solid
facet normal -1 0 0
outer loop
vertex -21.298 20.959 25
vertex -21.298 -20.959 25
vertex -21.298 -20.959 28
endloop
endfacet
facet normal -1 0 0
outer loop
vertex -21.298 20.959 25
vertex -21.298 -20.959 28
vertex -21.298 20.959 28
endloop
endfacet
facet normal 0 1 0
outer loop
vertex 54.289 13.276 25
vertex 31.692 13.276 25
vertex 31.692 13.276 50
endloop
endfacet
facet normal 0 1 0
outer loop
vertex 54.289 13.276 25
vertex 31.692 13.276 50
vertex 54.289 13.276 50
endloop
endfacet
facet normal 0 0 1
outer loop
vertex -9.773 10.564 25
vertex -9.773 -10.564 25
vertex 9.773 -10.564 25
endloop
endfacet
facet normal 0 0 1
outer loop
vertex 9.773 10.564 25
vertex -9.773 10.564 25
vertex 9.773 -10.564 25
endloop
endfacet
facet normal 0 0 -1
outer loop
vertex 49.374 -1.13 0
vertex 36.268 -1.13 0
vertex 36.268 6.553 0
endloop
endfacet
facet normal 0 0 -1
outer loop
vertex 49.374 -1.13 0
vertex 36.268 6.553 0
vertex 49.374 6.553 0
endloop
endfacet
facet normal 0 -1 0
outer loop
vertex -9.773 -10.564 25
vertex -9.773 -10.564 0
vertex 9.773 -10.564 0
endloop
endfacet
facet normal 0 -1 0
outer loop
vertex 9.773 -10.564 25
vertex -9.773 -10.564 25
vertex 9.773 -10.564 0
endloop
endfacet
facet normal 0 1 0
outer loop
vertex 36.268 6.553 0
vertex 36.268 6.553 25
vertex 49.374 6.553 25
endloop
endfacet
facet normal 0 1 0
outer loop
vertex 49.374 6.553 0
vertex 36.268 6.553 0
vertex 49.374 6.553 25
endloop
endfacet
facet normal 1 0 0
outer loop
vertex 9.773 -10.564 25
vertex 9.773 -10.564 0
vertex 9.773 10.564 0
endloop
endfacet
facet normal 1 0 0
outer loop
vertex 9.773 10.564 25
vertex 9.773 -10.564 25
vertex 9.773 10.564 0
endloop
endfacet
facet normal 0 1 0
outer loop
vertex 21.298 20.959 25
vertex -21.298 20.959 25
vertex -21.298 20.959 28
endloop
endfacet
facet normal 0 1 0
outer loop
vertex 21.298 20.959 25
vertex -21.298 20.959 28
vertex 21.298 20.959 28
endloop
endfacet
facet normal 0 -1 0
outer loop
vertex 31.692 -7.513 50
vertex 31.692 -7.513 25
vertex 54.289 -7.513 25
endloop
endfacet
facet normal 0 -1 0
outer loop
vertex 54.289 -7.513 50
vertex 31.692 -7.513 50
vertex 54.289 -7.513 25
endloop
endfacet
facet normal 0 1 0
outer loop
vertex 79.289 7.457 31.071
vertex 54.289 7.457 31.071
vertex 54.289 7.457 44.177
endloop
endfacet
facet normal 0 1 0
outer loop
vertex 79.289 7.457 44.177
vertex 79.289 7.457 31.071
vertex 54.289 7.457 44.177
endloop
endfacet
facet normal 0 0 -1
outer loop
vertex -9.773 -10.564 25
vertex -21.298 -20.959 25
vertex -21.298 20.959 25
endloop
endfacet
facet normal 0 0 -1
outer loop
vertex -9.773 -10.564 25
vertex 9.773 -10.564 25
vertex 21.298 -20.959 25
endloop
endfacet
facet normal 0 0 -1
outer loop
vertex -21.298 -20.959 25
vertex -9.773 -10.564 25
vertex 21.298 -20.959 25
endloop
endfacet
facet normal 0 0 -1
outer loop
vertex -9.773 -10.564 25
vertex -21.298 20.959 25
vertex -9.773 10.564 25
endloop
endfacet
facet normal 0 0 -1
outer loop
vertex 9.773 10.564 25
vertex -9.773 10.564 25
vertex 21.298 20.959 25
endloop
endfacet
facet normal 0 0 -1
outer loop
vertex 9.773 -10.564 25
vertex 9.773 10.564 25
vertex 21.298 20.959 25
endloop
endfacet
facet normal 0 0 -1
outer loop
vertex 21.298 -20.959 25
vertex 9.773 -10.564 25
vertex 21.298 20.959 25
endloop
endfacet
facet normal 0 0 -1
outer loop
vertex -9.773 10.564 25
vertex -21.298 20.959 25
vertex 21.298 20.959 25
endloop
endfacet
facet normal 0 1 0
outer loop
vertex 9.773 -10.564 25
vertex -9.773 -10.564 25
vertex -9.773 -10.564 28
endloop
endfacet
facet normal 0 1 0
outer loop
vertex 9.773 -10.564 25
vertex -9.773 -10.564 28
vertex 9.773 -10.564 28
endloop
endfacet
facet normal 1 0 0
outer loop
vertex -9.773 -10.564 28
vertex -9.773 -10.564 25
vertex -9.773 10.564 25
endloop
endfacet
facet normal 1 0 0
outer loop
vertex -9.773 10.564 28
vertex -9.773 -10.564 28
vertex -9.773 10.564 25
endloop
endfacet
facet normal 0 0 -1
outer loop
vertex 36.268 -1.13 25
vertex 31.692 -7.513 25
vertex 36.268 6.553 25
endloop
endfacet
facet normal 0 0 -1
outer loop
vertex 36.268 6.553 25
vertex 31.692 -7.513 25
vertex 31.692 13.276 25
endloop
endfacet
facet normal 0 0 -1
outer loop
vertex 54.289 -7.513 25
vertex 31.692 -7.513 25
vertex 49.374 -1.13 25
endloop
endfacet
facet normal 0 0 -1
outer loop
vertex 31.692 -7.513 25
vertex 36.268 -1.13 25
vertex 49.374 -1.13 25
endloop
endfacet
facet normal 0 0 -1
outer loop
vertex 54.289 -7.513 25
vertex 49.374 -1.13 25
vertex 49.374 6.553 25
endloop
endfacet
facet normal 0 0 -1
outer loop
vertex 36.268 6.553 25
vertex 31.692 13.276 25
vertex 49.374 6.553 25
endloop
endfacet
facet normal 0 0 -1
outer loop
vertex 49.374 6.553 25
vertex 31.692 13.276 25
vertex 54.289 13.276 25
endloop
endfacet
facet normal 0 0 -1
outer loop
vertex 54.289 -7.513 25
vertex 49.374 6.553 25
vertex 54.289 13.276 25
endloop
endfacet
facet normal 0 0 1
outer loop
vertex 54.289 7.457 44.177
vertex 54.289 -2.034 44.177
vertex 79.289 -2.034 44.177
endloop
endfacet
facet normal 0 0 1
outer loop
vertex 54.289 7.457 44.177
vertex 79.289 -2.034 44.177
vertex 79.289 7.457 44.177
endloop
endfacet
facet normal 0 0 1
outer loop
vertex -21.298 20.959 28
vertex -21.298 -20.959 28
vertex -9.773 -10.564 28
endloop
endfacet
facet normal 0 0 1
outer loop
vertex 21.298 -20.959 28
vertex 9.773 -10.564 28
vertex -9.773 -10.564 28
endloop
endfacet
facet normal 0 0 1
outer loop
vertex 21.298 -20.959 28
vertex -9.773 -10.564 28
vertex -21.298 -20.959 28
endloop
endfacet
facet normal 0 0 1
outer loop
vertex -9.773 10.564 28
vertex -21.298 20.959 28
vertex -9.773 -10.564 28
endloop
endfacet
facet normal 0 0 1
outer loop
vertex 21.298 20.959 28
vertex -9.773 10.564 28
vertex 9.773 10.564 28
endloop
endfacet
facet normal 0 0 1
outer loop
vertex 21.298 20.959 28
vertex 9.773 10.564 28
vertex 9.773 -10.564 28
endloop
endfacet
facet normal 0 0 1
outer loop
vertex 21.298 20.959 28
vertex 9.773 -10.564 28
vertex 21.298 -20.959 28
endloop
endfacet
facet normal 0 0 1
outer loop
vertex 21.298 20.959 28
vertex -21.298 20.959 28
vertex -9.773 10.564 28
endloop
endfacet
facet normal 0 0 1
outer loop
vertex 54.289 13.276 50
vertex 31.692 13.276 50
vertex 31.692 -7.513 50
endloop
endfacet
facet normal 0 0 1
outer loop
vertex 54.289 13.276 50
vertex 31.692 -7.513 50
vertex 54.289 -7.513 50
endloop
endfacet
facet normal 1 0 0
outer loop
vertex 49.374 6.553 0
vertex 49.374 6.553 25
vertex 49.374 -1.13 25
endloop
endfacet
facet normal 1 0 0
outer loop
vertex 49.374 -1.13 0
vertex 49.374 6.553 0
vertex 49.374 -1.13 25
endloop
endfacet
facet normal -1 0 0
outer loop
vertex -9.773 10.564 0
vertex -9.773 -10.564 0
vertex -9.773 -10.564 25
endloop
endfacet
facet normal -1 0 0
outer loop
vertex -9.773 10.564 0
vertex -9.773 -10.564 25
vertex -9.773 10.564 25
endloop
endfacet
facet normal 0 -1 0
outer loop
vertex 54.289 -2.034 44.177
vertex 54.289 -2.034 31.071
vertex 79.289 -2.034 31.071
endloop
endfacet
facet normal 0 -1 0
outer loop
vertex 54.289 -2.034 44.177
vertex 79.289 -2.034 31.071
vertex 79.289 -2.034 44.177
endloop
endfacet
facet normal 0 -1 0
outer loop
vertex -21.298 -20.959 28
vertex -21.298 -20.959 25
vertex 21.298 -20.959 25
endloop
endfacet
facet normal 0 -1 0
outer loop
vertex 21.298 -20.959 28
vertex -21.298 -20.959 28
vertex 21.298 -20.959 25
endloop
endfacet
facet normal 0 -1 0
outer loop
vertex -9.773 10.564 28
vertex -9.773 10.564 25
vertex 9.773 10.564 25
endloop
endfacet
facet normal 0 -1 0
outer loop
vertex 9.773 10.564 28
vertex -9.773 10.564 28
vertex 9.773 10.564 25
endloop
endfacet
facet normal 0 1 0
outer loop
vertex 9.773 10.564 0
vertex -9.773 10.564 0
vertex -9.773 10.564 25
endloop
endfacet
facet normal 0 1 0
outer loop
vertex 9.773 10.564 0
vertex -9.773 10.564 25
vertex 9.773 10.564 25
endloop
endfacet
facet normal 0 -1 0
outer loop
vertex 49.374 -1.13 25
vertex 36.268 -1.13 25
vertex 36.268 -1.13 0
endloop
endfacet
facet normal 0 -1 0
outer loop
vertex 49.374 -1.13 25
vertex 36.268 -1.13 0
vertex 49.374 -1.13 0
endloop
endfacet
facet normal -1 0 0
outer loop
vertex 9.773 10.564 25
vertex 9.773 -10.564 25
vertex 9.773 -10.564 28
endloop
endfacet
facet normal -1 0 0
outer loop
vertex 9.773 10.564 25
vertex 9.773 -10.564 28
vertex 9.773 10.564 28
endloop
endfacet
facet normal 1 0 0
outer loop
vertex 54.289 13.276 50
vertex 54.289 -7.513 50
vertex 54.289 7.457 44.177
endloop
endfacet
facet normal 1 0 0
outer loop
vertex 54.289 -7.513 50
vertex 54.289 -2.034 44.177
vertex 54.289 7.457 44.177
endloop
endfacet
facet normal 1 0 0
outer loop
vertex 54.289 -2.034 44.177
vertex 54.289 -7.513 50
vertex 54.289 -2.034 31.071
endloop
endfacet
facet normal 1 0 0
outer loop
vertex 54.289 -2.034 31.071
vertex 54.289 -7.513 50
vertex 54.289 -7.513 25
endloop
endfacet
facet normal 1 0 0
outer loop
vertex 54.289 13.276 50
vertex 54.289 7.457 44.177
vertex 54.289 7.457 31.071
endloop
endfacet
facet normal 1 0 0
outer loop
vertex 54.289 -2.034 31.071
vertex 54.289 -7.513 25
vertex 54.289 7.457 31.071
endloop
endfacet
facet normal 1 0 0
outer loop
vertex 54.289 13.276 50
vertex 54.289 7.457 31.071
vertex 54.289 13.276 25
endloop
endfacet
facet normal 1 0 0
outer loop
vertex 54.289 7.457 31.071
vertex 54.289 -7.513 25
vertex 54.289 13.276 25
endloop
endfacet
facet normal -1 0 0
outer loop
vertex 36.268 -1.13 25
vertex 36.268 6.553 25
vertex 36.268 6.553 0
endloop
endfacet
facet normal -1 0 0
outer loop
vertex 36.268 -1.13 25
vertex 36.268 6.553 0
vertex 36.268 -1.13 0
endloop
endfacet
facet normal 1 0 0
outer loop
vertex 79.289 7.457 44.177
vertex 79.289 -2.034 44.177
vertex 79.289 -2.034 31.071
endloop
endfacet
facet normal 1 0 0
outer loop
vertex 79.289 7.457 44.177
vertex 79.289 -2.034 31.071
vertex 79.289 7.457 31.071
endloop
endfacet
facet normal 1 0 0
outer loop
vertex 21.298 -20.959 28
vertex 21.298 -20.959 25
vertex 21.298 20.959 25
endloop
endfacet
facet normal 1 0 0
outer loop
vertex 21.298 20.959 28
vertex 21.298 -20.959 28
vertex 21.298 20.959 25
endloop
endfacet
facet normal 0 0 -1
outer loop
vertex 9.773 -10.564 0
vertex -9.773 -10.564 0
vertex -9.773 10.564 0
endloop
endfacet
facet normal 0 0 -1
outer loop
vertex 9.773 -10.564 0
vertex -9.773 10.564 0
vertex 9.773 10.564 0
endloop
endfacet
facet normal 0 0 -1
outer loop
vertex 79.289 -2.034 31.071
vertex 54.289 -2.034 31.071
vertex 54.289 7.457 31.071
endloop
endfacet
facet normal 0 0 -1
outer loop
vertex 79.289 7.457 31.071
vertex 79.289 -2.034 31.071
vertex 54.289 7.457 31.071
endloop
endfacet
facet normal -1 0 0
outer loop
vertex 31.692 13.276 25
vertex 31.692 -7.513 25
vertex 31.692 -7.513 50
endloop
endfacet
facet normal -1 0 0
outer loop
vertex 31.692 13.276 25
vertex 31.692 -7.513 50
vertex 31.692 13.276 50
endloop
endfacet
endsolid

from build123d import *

# Parameters (mm, degrees)
F0_W     = 19.5462685078
F0_H     = 21.128050983
F1_DEPTH = 25
F2_W     = 42.595051229
F2_H     = 41.9171489775
F2_W_2   = 19.5462685078
F2_H_2   = 21.128050983
F3_DEPTH = 3
F2_W_3   = 22.5968435407
F2_H_3   = 20.7890970632
F4_DEPTH = 25
F5_W     = 13.1061673164
F5_H     = 7.6829269528
F6_DEPTH = 25
F7_W     = 9.4906743616
F7_H     = 13.1061673164
F8_DEPTH = 25


with BuildPart() as f1:
    # F0 (on Top) → F1 (new body)
    with BuildSketch(Plane.XY):
        Rectangle(F0_W, F0_H)
    extrude(amount=F1_DEPTH)


with BuildPart() as f3:
    # F2 (on face) → F3 (new body)
    with BuildSketch(Plane.XY.offset(25)):
        Rectangle(F2_W, F2_H)
        Rectangle(F2_W_2, F2_H_2, mode=Mode.SUBTRACT)
    extrude(amount=F3_DEPTH)


with BuildPart() as f4:
    # F2 (on face) → F4 (new body)
    with BuildSketch(Plane.XY.offset(25)):
        with Locations((42.9904945195, 2.8810976073)):
            Rectangle(F2_W_3, F2_H_3)
    extrude(amount=F4_DEPTH)

    # F5 (on face) → F6 (join)
    with BuildSketch(Plane(origin=(0, 0, 25), x_dir=(1, 0, 0), z_dir=(0, 0, -1))):
        with Locations((42.8210198879, -2.7116178535)):
            Rectangle(F5_W, F5_H)
    extrude(amount=F6_DEPTH)

    # F7 (on face) → F8 (join)
    with BuildSketch(Plane.YZ.offset(54.2889162898)):
        with Locations((2.7116178535, 37.623744458)):
            Rectangle(F7_W, F7_H)
    extrude(amount=F8_DEPTH)


solid = Compound([f1.part, f3.part, f4.part])
